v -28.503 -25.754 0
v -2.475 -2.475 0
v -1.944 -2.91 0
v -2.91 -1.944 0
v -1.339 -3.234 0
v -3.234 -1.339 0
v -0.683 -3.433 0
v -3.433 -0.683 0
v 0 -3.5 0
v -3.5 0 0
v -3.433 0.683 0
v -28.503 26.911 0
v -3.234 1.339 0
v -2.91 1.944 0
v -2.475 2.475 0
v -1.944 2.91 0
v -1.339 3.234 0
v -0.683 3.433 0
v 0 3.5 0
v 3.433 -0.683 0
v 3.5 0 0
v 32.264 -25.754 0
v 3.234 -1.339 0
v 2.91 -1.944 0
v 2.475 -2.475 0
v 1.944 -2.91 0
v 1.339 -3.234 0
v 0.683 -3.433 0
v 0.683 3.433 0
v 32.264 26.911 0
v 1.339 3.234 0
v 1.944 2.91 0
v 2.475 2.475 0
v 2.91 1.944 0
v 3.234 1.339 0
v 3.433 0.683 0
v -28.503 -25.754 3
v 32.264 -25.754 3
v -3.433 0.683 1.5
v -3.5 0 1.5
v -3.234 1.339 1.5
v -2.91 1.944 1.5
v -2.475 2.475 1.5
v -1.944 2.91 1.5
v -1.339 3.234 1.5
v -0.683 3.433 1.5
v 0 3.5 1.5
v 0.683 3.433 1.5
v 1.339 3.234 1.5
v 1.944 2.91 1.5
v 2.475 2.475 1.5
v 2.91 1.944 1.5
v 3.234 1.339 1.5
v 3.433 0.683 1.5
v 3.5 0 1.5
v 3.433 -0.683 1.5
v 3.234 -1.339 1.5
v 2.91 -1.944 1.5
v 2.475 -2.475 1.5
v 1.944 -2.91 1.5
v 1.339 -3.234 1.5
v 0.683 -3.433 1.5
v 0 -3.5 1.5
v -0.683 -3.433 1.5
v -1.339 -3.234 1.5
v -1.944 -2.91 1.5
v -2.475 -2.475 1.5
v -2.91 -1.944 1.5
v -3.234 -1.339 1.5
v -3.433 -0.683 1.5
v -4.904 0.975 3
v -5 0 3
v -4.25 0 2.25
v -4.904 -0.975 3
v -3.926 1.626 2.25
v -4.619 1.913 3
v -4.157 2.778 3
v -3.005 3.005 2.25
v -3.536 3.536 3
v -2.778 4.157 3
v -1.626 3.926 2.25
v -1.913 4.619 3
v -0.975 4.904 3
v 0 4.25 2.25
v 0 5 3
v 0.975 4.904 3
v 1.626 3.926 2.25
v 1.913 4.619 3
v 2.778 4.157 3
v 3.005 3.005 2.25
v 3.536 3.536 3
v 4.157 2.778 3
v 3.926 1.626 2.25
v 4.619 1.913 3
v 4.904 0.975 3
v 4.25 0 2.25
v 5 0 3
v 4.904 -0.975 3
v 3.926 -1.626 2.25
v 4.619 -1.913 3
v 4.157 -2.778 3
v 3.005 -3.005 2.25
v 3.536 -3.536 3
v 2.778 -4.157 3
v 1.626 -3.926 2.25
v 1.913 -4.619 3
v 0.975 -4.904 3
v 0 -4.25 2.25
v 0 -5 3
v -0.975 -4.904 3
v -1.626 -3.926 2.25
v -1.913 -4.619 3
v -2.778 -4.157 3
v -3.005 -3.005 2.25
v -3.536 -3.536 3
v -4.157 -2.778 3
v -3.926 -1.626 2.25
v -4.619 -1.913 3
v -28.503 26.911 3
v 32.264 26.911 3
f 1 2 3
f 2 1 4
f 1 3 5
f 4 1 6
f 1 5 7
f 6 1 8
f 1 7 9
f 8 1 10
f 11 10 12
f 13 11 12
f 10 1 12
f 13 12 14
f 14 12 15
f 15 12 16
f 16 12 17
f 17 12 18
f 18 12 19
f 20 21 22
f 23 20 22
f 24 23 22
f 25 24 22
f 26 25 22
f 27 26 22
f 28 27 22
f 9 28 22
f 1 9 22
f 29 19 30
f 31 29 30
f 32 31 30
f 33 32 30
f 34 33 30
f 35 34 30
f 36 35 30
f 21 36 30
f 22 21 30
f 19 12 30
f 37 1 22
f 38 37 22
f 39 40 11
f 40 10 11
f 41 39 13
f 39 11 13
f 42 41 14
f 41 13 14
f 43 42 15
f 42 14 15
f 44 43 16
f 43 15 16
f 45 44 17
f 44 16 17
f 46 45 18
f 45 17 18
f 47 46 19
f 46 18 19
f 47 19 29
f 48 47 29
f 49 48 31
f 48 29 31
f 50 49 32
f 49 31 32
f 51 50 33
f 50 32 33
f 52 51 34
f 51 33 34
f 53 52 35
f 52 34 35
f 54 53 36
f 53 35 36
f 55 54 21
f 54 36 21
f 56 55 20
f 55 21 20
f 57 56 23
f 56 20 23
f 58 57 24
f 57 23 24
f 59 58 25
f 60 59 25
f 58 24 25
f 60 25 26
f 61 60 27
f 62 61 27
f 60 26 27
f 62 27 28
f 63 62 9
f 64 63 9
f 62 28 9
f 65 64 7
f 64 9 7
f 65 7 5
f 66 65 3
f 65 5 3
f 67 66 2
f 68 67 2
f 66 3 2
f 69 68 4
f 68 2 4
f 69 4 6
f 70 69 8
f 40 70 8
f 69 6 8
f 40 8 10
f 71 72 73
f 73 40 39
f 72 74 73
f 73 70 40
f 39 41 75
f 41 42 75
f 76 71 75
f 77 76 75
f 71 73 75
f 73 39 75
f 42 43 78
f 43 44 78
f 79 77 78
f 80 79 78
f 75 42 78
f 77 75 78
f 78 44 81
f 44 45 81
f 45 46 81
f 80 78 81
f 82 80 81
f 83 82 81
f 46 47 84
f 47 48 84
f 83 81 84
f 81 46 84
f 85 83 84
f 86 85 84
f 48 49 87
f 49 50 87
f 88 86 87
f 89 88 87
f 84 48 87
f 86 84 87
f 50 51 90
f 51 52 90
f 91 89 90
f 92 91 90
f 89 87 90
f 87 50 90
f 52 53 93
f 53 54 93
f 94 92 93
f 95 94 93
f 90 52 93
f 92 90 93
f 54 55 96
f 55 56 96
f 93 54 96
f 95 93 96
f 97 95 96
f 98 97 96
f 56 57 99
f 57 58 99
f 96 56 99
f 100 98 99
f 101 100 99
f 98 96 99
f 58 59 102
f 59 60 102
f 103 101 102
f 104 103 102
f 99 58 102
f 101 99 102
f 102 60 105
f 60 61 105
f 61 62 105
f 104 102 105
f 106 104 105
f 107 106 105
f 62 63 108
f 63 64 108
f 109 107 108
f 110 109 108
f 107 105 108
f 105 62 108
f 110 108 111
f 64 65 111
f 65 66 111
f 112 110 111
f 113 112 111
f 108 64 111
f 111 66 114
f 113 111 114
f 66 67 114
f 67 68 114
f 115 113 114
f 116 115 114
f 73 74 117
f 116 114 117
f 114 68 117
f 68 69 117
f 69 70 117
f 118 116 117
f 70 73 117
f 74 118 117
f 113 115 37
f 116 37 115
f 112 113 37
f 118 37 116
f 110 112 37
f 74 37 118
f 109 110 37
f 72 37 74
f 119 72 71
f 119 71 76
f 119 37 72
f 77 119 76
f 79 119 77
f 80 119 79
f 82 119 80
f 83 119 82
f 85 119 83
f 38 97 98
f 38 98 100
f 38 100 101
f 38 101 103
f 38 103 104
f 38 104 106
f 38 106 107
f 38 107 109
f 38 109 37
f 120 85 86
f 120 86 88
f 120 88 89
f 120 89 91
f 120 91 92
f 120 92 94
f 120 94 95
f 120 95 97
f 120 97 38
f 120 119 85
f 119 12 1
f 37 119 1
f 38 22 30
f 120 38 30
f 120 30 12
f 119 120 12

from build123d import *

# Parameters (mm, degrees)
F1_DEPTH       = 3
F3_D           = 7
F3_DEPTH       = 15.24
F3_CSINK_D     = 10
F3_CSINK_ANGLE = 90


with BuildPart() as f1:
    # F0 (on Top) → F1 (new body)
    with BuildSketch(Plane.XY):
        Polygon((32.264434, -25.753669), (32.264434, 0), (32.264434, 26.911139), (0, 26.911139), (-28.502658, 26.911139), (-28.502658, 0), (-28.502658, -25.753669), (0, -25.753669), align=None)
    extrude(amount=F1_DEPTH)

    # F3
    with Locations(Plane.XY.offset(3)):
        with Locations((0, 0)):
            CounterSinkHole(F3_D / 2, F3_CSINK_D / 2, depth=F3_DEPTH, counter_sink_angle=F3_CSINK_ANGLE)


solid = f1.part
